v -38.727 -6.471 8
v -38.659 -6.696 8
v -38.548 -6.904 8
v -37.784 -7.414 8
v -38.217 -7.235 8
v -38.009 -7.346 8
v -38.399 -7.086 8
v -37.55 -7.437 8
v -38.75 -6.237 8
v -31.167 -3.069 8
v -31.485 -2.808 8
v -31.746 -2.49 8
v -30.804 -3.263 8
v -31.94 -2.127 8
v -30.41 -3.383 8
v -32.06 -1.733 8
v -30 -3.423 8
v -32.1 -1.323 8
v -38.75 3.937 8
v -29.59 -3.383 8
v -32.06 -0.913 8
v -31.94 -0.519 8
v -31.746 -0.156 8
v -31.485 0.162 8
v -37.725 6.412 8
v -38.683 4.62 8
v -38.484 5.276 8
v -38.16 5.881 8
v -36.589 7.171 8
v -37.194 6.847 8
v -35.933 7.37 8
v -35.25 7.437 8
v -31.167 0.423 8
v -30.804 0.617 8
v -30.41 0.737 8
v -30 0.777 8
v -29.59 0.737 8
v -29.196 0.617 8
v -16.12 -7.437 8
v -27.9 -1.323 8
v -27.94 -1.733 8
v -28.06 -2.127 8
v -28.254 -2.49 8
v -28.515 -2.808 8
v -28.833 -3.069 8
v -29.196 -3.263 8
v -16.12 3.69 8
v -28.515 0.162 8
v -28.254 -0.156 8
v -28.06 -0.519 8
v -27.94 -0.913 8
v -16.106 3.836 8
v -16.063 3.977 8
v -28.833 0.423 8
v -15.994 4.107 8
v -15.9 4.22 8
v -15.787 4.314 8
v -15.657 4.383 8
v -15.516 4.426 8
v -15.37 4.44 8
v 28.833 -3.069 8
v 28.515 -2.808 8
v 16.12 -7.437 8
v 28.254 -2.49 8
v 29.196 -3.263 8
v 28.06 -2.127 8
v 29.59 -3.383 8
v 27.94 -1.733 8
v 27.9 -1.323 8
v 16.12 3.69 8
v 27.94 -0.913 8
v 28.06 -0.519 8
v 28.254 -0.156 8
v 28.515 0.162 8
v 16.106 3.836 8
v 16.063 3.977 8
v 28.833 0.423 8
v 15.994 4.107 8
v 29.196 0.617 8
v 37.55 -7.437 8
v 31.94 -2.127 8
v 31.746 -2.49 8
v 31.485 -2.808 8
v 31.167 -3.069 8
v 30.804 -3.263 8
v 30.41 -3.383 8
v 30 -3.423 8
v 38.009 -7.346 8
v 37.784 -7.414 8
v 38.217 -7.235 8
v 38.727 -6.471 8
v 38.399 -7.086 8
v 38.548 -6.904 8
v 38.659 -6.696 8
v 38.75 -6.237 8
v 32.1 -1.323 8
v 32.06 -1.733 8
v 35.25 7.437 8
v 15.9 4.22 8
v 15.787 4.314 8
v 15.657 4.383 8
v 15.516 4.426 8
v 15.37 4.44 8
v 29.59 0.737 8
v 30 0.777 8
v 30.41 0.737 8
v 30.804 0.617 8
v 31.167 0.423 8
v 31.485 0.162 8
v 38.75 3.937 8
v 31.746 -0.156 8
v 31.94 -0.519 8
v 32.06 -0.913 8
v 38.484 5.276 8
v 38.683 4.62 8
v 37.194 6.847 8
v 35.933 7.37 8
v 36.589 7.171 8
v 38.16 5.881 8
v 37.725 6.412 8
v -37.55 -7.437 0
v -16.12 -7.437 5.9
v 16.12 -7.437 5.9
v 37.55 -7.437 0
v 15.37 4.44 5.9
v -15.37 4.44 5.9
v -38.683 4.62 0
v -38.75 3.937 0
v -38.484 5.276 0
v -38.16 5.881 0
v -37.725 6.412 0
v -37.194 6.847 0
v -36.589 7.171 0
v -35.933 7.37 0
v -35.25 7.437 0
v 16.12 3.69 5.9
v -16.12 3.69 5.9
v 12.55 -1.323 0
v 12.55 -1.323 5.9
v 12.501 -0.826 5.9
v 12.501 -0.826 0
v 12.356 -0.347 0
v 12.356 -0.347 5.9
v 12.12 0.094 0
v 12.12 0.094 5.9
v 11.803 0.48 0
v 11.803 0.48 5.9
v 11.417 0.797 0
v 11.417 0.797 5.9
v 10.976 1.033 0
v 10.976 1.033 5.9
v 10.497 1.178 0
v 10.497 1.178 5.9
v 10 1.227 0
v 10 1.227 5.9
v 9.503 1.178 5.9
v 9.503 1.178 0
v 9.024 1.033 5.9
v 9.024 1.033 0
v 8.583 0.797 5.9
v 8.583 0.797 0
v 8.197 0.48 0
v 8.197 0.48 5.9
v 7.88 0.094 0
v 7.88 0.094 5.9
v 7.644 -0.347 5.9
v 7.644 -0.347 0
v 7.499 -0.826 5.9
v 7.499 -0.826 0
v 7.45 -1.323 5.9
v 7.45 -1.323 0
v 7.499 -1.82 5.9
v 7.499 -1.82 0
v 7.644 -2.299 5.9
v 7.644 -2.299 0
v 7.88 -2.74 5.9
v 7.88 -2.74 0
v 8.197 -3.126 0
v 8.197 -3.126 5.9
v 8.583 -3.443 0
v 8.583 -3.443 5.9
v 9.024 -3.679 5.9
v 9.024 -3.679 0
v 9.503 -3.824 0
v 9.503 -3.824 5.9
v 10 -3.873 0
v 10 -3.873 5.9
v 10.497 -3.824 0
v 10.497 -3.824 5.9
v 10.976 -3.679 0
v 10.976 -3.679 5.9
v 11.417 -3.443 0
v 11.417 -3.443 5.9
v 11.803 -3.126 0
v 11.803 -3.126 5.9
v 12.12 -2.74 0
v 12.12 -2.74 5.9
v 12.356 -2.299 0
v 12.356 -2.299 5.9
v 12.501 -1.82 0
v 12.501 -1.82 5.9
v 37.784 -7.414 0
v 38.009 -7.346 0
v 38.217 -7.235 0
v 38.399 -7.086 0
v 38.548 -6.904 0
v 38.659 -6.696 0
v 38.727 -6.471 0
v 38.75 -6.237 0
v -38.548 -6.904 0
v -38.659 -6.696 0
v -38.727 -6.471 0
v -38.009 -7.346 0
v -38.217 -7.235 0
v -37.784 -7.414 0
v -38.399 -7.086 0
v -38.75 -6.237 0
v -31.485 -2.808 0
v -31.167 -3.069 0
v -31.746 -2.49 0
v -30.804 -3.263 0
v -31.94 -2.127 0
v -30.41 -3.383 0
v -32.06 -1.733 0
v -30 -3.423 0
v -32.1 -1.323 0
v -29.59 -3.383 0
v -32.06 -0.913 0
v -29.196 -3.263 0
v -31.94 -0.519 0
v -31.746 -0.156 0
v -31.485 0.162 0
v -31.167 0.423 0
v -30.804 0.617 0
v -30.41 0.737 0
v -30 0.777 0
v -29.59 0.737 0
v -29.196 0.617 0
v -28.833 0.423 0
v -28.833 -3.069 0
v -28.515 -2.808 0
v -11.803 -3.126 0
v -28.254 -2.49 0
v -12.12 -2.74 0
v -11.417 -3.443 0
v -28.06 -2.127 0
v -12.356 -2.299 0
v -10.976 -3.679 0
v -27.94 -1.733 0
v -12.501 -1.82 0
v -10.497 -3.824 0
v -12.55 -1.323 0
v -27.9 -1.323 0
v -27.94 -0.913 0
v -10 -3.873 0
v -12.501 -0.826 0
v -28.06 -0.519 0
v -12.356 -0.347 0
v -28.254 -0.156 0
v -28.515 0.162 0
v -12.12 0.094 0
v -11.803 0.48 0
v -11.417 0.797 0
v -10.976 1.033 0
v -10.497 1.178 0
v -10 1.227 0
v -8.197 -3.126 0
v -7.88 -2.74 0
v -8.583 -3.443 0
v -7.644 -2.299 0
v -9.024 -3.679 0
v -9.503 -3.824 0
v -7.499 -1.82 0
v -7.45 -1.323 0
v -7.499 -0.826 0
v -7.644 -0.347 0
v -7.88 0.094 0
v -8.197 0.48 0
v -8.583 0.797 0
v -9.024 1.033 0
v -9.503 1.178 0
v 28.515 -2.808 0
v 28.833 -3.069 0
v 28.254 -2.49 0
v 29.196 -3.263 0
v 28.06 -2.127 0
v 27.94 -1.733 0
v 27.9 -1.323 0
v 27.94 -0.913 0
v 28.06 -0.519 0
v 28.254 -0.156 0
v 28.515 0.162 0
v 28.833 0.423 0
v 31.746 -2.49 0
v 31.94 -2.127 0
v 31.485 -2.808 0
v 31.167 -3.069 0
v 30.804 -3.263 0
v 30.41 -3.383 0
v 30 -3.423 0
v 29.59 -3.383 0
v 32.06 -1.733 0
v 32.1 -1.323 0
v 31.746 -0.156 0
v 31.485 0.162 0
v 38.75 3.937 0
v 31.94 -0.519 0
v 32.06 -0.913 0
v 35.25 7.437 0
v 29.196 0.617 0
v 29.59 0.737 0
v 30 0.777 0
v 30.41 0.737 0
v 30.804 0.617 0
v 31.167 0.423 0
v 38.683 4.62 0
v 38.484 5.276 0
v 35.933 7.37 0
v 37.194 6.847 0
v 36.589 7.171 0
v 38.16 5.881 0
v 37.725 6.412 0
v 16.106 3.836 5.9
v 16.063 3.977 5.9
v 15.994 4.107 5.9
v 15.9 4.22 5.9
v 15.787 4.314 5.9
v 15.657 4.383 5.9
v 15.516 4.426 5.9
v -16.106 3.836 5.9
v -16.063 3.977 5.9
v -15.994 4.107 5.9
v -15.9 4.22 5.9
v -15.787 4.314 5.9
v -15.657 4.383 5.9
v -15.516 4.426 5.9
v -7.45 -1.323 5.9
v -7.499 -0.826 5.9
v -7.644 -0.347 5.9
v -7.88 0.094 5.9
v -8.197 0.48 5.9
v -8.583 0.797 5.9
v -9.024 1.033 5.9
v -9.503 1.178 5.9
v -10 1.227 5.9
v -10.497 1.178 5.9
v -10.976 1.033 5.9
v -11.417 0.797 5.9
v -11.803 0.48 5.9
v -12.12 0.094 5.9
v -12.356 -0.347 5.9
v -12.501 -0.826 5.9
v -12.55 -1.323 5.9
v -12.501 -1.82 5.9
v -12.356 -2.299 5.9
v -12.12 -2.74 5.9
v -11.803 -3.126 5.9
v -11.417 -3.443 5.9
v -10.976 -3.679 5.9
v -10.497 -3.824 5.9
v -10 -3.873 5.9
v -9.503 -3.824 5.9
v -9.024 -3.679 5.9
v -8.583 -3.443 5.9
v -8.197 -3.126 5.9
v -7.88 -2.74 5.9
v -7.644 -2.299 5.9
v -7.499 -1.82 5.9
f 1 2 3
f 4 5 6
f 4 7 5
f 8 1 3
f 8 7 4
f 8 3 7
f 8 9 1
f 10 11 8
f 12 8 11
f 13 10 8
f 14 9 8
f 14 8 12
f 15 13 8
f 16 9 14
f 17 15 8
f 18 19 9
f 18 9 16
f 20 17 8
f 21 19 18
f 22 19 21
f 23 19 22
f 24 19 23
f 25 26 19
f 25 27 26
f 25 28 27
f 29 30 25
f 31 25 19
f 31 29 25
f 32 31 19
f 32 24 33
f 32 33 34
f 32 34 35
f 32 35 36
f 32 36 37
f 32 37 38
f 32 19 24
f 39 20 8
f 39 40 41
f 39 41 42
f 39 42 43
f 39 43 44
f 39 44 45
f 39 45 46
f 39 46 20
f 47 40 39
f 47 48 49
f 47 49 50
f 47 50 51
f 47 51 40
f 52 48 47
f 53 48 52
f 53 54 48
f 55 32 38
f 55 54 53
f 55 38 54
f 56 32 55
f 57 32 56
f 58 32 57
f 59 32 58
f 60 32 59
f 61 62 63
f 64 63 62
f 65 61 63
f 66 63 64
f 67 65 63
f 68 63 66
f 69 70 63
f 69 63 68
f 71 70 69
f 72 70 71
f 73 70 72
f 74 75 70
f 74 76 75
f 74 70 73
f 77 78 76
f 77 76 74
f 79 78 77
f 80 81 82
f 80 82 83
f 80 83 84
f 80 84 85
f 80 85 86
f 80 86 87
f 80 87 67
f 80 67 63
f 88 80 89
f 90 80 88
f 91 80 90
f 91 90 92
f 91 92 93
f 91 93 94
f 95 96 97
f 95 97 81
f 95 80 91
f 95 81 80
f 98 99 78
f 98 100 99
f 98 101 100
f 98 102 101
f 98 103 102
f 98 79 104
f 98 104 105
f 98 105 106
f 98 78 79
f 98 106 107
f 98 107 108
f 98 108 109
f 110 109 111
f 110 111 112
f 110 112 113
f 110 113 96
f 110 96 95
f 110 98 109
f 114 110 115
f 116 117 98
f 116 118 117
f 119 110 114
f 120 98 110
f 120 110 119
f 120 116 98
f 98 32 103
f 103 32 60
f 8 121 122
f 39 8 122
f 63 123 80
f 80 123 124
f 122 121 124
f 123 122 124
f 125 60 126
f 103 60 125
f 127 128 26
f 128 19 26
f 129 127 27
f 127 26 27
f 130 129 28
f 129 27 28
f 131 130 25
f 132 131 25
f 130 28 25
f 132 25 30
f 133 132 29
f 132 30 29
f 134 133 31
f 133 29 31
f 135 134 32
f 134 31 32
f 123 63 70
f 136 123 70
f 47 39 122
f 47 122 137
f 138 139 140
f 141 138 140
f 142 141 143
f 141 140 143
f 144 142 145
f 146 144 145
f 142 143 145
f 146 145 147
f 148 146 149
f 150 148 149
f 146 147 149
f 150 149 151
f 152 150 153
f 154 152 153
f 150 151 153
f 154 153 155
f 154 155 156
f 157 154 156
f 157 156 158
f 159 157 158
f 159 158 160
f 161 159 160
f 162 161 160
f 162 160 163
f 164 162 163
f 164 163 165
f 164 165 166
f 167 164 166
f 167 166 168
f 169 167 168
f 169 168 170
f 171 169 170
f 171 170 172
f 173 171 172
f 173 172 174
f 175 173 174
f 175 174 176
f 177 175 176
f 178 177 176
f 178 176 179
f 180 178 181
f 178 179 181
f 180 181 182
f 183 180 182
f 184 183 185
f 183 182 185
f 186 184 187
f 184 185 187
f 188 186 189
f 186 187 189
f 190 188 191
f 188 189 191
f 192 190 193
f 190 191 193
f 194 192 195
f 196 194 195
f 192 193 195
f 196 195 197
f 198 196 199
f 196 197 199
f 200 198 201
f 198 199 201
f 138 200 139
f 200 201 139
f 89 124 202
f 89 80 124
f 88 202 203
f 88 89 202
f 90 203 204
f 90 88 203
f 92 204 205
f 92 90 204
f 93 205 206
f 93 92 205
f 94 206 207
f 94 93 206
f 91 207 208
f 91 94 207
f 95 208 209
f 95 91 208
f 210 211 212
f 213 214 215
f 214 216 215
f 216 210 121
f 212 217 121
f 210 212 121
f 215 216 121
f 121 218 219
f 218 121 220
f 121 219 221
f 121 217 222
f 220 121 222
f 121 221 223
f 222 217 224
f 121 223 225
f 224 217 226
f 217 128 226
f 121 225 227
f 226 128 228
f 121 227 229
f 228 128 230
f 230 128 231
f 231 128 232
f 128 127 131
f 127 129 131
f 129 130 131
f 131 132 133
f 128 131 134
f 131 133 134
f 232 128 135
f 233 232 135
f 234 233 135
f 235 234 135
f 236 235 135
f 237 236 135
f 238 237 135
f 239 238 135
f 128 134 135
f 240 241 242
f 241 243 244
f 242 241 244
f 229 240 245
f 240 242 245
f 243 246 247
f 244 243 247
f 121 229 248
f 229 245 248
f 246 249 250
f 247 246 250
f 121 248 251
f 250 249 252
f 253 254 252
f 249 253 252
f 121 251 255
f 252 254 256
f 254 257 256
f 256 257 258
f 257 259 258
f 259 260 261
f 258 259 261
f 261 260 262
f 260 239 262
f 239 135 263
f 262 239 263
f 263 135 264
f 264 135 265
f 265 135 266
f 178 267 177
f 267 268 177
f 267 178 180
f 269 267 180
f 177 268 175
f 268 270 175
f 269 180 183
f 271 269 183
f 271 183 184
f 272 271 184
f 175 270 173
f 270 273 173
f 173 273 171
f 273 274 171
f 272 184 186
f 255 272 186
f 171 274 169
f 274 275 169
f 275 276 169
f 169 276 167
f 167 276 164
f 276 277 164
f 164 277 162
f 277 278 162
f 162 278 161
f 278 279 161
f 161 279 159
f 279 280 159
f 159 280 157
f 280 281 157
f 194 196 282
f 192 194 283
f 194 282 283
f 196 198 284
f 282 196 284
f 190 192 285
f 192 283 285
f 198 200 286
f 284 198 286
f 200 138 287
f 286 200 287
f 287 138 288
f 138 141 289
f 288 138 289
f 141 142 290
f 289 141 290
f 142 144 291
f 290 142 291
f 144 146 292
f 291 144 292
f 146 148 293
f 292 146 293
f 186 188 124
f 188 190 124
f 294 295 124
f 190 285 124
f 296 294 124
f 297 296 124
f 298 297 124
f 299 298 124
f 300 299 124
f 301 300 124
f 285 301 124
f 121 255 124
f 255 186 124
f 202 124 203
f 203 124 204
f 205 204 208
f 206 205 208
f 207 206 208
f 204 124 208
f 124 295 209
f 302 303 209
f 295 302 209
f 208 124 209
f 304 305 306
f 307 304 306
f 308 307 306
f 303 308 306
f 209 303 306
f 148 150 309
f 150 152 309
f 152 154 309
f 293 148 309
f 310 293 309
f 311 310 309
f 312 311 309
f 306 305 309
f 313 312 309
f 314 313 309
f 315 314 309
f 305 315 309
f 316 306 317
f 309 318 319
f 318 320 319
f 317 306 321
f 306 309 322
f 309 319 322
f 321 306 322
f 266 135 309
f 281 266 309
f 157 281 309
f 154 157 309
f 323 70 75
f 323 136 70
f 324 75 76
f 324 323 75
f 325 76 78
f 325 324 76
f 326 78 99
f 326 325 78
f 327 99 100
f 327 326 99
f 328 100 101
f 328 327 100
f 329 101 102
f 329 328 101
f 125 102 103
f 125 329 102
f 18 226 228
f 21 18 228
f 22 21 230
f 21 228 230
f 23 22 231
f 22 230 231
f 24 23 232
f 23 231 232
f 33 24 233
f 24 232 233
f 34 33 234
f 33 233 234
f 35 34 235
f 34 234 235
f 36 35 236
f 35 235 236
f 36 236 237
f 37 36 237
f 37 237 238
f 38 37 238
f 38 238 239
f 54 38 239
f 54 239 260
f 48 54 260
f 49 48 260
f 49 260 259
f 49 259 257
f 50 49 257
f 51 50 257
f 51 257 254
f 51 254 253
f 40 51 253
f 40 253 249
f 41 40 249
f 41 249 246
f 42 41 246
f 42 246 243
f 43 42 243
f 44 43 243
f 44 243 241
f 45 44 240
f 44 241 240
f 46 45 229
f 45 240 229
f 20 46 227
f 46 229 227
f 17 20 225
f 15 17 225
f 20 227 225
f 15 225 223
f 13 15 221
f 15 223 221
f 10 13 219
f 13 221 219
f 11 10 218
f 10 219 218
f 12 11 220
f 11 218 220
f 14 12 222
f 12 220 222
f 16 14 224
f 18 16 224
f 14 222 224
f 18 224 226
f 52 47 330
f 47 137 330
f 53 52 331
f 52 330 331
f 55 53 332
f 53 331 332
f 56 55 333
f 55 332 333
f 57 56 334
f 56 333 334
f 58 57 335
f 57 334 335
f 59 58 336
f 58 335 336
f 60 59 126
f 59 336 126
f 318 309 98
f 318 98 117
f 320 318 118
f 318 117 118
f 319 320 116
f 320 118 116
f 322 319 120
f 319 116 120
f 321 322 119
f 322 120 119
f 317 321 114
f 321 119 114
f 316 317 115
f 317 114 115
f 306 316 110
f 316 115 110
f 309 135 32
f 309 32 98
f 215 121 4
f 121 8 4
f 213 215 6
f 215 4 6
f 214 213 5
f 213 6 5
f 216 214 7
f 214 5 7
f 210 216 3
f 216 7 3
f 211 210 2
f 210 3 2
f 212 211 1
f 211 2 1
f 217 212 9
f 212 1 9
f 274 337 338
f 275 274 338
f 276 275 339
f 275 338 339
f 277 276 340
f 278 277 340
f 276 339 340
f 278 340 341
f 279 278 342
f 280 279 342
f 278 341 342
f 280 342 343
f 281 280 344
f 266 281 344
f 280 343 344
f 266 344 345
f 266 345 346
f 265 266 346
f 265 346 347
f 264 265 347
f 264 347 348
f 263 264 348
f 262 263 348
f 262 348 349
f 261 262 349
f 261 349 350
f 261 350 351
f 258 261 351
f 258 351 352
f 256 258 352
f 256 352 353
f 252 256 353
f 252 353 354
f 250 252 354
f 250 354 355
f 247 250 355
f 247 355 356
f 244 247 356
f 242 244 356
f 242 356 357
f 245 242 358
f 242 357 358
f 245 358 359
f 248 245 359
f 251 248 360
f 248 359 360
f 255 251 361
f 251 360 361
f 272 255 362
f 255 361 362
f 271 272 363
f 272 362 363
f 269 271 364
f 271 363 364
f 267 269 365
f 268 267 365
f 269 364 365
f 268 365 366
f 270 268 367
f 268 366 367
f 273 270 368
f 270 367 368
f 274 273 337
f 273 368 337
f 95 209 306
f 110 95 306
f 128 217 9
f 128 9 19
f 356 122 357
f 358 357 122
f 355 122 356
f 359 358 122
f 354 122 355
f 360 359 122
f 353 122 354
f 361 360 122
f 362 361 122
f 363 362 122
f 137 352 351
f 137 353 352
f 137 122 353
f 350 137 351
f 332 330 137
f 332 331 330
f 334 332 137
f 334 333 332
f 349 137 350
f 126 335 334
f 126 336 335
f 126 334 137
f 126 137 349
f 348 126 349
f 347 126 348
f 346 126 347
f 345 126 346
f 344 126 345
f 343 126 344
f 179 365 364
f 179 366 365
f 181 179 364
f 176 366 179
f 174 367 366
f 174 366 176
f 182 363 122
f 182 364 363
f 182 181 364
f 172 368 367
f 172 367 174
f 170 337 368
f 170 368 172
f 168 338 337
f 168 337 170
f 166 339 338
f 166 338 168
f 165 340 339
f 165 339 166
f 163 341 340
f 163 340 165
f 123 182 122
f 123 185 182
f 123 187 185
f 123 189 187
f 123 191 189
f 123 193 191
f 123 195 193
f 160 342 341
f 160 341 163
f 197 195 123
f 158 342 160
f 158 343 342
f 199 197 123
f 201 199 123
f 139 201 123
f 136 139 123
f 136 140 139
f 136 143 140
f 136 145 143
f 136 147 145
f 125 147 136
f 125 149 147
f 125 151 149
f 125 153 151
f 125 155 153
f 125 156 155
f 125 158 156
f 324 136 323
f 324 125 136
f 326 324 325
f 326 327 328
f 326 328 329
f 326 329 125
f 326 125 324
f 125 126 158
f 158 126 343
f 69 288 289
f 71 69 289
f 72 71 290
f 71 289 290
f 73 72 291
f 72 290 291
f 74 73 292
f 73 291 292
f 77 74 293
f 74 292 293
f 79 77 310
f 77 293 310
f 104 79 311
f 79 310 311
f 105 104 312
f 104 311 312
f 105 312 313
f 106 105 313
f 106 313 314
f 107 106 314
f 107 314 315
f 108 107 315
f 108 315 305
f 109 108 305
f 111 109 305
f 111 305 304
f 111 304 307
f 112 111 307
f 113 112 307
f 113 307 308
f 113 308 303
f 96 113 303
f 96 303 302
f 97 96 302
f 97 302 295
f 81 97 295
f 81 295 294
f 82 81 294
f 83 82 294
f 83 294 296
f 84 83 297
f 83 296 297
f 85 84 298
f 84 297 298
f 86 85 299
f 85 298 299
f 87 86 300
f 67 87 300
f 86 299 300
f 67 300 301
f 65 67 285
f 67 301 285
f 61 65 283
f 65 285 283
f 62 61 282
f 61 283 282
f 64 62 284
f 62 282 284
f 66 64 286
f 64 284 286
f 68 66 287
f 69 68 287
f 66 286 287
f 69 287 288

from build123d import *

# Parameters (mm, degrees)
SKETCH1_W             = 77.5
SKETCH1_H             = 14.874
BOSS_EXTRUDE1_DEPTH   = 8
SKETCH2_W             = 32.24
SKETCH2_H             = 11.877
CUT_EXTRUDE1_DEPTH    = 2.1
FILLET1_R             = 3.5
FILLET2_R             = 0.75
SKETCH3_R             = 2.55
CUT_EXTRUDE2_DEPTH    = 6.9
M5X0_8_TAPPED_HOLE1_D = 4.2
FILLET3_R             = 1.2


with BuildPart() as part:
    # Sketch1 → Boss-Extrude1 (new body)
    with BuildSketch(Plane.XY):
        Rectangle(SKETCH1_W, SKETCH1_H)
    extrude(amount=BOSS_EXTRUDE1_DEPTH)

    # Sketch2 → Cut-Extrude1 (cut)
    with BuildSketch(Plane.XY.offset(8)):
        with Locations((0, -1.4985)):
            Rectangle(SKETCH2_W, SKETCH2_H)
    extrude(amount=-CUT_EXTRUDE1_DEPTH, mode=Mode.SUBTRACT)

    # Fillet1
    fillet1_edges = [part.edges().sort_by_distance(p)[0] for p in [
        (-38.75, 7.437, 4),
        (38.75, 7.437, 4),
    ]]
    fillet(fillet1_edges, radius=FILLET1_R)

    # Fillet2
    fillet2_edges = [part.edges().sort_by_distance(p)[0] for p in [
        (-16.12, 4.44, 6.95),
        (16.12, 4.44, 6.95),
    ]]
    fillet(fillet2_edges, radius=FILLET2_R)

    # Sketch3 → Cut-Extrude2 (cut, through all)
    with BuildSketch(Plane.XY.offset(5.9)):
        with Locations((-10, -1.323)):
            Circle(SKETCH3_R)
        with Locations((10, -1.323)):
            Circle(SKETCH3_R)
    extrude(amount=-CUT_EXTRUDE2_DEPTH, mode=Mode.SUBTRACT)

    # M5x0.8 Tapped Hole1 (through all)
    with Locations(Plane.XY.offset(8)):
        with Locations((-30, -1.323), (30, -1.323)):
            Hole(M5X0_8_TAPPED_HOLE1_D / 2)

    # Fillet3
    fillet3_edges = [part.edges().sort_by_distance(p)[0] for p in [
        (38.75, -7.437, 4),
        (-38.75, -7.437, 4),
    ]]
    fillet(fillet3_edges, radius=FILLET3_R)


solid = part.part
